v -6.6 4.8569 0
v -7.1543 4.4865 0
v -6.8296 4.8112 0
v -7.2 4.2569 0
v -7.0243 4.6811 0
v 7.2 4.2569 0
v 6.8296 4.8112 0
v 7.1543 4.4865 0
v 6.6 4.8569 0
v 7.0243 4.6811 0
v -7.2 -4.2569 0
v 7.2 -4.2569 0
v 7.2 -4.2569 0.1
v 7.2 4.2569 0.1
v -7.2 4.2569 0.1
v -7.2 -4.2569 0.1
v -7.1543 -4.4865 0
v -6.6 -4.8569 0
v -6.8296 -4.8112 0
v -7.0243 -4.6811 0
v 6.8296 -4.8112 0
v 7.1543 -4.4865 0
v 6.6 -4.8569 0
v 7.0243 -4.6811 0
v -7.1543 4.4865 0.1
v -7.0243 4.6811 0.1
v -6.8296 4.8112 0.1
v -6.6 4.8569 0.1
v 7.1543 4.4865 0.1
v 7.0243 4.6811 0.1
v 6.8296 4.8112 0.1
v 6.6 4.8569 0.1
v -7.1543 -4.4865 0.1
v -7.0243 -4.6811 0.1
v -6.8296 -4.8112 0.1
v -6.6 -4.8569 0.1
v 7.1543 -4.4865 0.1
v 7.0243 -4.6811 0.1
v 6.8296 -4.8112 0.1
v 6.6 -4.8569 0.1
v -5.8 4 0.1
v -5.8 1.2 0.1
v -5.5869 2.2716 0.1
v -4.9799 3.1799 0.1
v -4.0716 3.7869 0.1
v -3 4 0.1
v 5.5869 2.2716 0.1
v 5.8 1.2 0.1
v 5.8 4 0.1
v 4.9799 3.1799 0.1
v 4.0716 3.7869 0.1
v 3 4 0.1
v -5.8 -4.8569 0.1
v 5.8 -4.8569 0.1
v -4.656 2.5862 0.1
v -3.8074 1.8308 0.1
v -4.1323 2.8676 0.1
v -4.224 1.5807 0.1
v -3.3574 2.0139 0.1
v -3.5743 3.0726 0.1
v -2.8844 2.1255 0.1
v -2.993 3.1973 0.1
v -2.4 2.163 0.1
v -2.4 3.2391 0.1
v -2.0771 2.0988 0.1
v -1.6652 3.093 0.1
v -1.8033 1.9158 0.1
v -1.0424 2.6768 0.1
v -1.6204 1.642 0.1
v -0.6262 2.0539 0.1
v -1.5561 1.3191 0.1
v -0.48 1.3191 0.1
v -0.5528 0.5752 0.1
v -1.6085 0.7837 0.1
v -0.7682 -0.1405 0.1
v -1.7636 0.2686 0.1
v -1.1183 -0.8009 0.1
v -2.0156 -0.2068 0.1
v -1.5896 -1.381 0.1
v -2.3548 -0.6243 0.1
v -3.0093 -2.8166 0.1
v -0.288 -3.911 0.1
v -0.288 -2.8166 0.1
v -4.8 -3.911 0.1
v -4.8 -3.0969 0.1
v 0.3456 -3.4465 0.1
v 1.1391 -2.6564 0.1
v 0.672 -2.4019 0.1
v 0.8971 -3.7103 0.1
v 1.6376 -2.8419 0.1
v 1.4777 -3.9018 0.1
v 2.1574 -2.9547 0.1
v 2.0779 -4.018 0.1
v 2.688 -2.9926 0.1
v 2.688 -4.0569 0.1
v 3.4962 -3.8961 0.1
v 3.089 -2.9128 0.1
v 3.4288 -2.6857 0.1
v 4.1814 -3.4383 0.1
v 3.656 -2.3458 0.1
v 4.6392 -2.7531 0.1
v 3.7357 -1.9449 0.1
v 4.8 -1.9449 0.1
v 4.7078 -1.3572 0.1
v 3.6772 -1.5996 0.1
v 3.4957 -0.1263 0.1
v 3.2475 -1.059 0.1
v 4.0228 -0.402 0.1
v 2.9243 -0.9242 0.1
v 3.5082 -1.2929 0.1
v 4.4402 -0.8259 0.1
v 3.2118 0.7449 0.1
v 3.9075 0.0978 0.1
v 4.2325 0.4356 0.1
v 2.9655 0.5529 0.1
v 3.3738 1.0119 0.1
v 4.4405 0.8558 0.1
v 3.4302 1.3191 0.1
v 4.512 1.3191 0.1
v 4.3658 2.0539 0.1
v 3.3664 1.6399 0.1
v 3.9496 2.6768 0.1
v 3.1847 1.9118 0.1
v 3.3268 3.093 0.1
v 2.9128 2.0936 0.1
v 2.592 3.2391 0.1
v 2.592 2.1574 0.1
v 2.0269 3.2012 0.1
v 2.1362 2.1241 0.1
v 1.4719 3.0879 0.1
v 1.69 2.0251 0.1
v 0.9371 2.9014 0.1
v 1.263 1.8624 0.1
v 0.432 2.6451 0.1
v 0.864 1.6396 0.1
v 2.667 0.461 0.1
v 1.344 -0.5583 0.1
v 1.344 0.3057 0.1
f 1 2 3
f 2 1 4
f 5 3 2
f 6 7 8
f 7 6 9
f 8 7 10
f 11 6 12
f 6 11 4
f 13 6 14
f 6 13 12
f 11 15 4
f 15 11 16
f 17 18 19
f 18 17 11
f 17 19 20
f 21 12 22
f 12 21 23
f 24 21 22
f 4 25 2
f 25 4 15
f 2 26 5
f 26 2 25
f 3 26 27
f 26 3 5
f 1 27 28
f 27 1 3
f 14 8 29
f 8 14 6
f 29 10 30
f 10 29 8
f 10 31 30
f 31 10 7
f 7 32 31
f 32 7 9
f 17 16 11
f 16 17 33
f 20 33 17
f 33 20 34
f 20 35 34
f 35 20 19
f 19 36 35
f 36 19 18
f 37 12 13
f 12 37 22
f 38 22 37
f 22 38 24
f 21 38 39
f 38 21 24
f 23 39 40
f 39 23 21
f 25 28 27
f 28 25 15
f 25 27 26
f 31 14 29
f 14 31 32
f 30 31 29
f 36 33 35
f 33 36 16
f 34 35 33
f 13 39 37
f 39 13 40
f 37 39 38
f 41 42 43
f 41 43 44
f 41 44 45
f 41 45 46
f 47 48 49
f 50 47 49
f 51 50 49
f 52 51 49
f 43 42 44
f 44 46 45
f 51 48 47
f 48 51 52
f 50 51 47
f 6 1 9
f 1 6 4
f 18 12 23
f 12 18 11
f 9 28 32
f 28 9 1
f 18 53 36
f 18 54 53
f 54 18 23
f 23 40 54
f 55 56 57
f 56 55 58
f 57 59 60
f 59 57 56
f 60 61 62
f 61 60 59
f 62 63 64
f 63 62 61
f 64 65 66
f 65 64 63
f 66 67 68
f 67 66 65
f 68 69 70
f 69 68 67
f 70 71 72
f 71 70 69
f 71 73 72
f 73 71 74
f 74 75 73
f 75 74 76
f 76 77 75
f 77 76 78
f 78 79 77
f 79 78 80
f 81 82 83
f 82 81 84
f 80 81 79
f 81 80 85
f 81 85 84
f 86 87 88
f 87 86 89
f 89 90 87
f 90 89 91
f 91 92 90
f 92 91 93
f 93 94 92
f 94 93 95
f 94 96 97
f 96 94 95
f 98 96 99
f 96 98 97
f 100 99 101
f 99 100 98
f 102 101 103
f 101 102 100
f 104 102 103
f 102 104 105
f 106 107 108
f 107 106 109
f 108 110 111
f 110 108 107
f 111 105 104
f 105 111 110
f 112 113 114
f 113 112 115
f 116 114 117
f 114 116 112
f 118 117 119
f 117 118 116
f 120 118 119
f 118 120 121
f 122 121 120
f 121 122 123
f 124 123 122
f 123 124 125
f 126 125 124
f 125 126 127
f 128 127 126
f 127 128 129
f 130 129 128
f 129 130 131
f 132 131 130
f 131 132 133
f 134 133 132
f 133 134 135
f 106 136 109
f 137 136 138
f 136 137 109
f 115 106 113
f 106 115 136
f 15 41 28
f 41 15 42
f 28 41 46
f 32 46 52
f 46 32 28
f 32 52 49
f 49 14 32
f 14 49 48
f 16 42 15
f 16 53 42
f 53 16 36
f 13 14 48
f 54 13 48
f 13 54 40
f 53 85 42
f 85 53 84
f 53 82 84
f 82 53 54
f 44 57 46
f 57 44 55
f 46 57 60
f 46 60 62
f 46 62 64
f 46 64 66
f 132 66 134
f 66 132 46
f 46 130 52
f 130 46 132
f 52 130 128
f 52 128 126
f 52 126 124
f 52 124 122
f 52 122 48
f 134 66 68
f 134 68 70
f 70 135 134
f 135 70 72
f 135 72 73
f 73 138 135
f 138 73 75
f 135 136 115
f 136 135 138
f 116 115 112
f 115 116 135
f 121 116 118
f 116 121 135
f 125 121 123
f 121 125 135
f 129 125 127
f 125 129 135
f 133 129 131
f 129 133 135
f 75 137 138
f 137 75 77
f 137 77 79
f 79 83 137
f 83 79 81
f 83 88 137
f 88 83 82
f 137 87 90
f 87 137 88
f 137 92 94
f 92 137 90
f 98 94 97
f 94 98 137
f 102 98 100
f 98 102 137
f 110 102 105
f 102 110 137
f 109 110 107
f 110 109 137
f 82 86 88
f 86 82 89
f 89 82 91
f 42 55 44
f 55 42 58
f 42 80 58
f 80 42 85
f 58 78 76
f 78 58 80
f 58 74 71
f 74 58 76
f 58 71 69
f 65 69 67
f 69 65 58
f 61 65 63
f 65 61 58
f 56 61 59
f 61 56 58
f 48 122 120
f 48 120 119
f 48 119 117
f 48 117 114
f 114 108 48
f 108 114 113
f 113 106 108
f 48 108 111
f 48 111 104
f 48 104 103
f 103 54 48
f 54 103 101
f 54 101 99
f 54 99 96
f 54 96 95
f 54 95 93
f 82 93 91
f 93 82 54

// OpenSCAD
// file: ../p/box3u12.scad
use <../lib.scad>
function ldraw_lib__box3u12() = [
// 0 Box with 3 Parallel Faces without Any Edges
// 0 Name: box3u12.dat
// 0 Author: J.C. Tchang [tchang]
// 0 !LDRAW_ORG Primitive UPDATE 2014-02
// 0 !LICENSE Licensed under CC BY 4.0 : see CAreadme.txt
// 
// 0 BFC CERTIFY CCW
  [0,"BFC","CERTIFY"],
  [0,"BFC","CCW"],
// 
// 0 !HISTORY 2014-12-23 [PTadmin] Official Update 2014-02
// 
// 
// 4 16 -1 1 1 1 1 1 1 1 -1 -1 1 -1
  [4,16,-1,1,1,1,1,1,1,1,-1,-1,1,-1],
// 4 16 -1 1 1 -1 0 1 1 0 1 1 1 1
  [4,16,-1,1,1,-1,0,1,1,0,1,1,1,1],
// 4 16 1 1 -1 1 0 -1 -1 0 -1 -1 1 -1
  [4,16,1,1,-1,1,0,-1,-1,0,-1,-1,1,-1],
];
module ldraw_lib__box3u12(step=0, col=false, unit=2/5, alt=false, line=0.2, solid=!$preview)
    makepoly(ldraw_lib__box3u12(), step=step, col=col, unit=unit, alt=alt, line=line, solid=solid);
ldraw_lib__box3u12(line=0.2);
// file: ../p/1-8chrd.scad
use <../lib.scad>
function ldraw_lib__1_8chrd() = [
// 0 Chord 0.125
// 0 Name: 1-8chrd.dat
// 0 Author: Orion Pobursky [OrionP]
// 0 !LDRAW_ORG Primitive UPDATE 2023-05
// 0 !LICENSE Licensed under CC BY 4.0 : see CAreadme.txt
// 
// 0 BFC CERTIFY CCW
  [0,"BFC","CERTIFY"],
  [0,"BFC","CCW"],
// 
// 0 !HISTORY 2004-04-22 [PTadmin] Official Update 2004-02
// 0 !HISTORY 2007-06-22 [PTadmin] Header formatted for Contributor Agreement
// 0 !HISTORY 2008-07-01 [PTadmin] Official Update 2008-01
// 0 !HISTORY 2023-10-27 [OrionP] Rebuilt with PrimGen2, original author westrate
// 0 !HISTORY 2023-10-31 [OrionP] Official Update 2023-05
// 
// 3 16 1 0 0 0.9239 0 0.3827 0.7071 0 0.7071
  [3,16,1,0,0,0.9239,0,0.3827,0.7071,0,0.7071],
];
module ldraw_lib__1_8chrd(step=0, col=false, unit=2/5, alt=false, line=0.2, solid=!$preview)
    makepoly(ldraw_lib__1_8chrd(), step=step, col=col, unit=unit, alt=alt, line=line, solid=solid);
ldraw_lib__1_8chrd(line=0.2);
// file: ../p/1-4ndis.scad
use <../lib.scad>
function ldraw_lib__1_4ndis() = [
// 0 Disc Negative 0.25
// 0 Name: 1-4ndis.dat
// 0 Author: James Jessiman
// 0 !LDRAW_ORG Primitive UPDATE 2012-01
// 0 !LICENSE Licensed under CC BY 4.0 : see CAreadme.txt
// 
// 0 BFC CERTIFY CCW
  [0,"BFC","CERTIFY"],
  [0,"BFC","CCW"],
// 
// 0 !HISTORY 2002-03-23 [sbliss] Added BFC Statement
// 0 !HISTORY 2002-04-25 [PTadmin] Official Update 2002-02
// 0 !HISTORY 2007-06-22 [PTadmin] Header formatted for Contributor Agreement
// 0 !HISTORY 2008-07-01 [PTadmin] Official Update 2008-01
// 0 !HISTORY 2012-02-16 [Philo] Changed to CCW
// 0 !HISTORY 2012-03-30 [PTadmin] Official Update 2012-01
// 
// 
// 3 16 0.9239 0 0.3827 1 0 0 1 0 1
  [3,16,0.9239,0,0.3827,1,0,0,1,0,1],
// 3 16 0.7071 0 0.7071 0.9239 0 0.3827 1 0 1
  [3,16,0.7071,0,0.7071,0.9239,0,0.3827,1,0,1],
// 3 16 0.3827 0 0.9239 0.7071 0 0.7071 1 0 1
  [3,16,0.3827,0,0.9239,0.7071,0,0.7071,1,0,1],
// 3 16 0 0 1 0.3827 0 0.9239 1 0 1
  [3,16,0,0,1,0.3827,0,0.9239,1,0,1],
];
module ldraw_lib__1_4ndis(step=0, col=false, unit=2/5, alt=false, line=0.2, solid=!$preview)
    makepoly(ldraw_lib__1_4ndis(), step=step, col=col, unit=unit, alt=alt, line=line, solid=solid);
ldraw_lib__1_4ndis(line=0.2);
// file: ../p/1-4cyli.scad
use <../lib.scad>
function ldraw_lib__1_4cyli() = [
// 0 Cylinder 0.25
// 0 Name: 1-4cyli.dat
// 0 Author: James Jessiman
// 0 !LDRAW_ORG Primitive UPDATE 2012-01
// 0 !LICENSE Licensed under CC BY 4.0 : see CAreadme.txt
// 
// 0 BFC CERTIFY CCW
  [0,"BFC","CERTIFY"],
  [0,"BFC","CCW"],
// 
// 0 !HISTORY 2002-03-23 [sbliss] Added BFC statement.
// 0 !HISTORY 2002-04-25 [PTadmin] Official Update 2002-02
// 0 !HISTORY 2007-06-22 [PTadmin] Header formatted for Contributor Agreement
// 0 !HISTORY 2008-07-01 [PTadmin] Official Update 2008-01
// 0 !HISTORY 2012-02-16 [Philo] Changed to CCW
// 0 !HISTORY 2012-03-30 [PTadmin] Official Update 2012-01
// 
// 
// 4 16 1 1 0 0.9239 1 0.3827 0.9239 0 0.3827 1 0 0
  [4,16,1,1,0,0.9239,1,0.3827,0.9239,0,0.3827,1,0,0],
// 5 24 1 0 0 1 1 0 0.9239 0 0.3827 1 0 -1
  [5,24,1,0,0,1,1,0,0.9239,0,0.3827,1,0,-1],
// 4 16 0.9239 1 0.3827 0.7071 1 0.7071 0.7071 0 0.7071 0.9239 0 0.3827
  [4,16,0.9239,1,0.3827,0.7071,1,0.7071,0.7071,0,0.7071,0.9239,0,0.3827],
// 5 24 0.9239 0 0.3827 0.9239 1 0.3827 0.7071 0 0.7071 1 0 0
  [5,24,0.9239,0,0.3827,0.9239,1,0.3827,0.7071,0,0.7071,1,0,0],
// 4 16 0.7071 1 0.7071 0.3827 1 0.9239 0.3827 0 0.9239 0.7071 0 0.7071
  [4,16,0.7071,1,0.7071,0.3827,1,0.9239,0.3827,0,0.9239,0.7071,0,0.7071],
// 5 24 0.7071 0 0.7071 0.7071 1 0.7071 0.3827 0 0.9239 0.9239 0 0.3827
  [5,24,0.7071,0,0.7071,0.7071,1,0.7071,0.3827,0,0.9239,0.9239,0,0.3827],
// 4 16 0.3827 1 0.9239 0 1 1 0 0 1 0.3827 0 0.9239
  [4,16,0.3827,1,0.9239,0,1,1,0,0,1,0.3827,0,0.9239],
// 5 24 0.3827 0 0.9239 0.3827 1 0.9239 0 0 1 0.7071 0 0.7071
  [5,24,0.3827,0,0.9239,0.3827,1,0.9239,0,0,1,0.7071,0,0.7071],
// 5 24 0 0 1 0 1 1 0.3827 0 0.9239 -1 0 1
  [5,24,0,0,1,0,1,1,0.3827,0,0.9239,-1,0,1],
];
module ldraw_lib__1_4cyli(step=0, col=false, unit=2/5, alt=false, line=0.2, solid=!$preview)
    makepoly(ldraw_lib__1_4cyli(), step=step, col=col, unit=unit, alt=alt, line=line, solid=solid);
ldraw_lib__1_4cyli(line=0.2);
// file: ../p/1-4chrd.scad
use <../lib.scad>
function ldraw_lib__1_4chrd() = [
// 0 Chord 0.25
// 0 Name: 1-4chrd.dat
// 0 Author: Max Martin Richter [MMR1988]
// 0 !LDRAW_ORG Primitive UPDATE 2023-05
// 0 !LICENSE Licensed under CC BY 4.0 : see CAreadme.txt
// 
// 0 BFC CERTIFY CCW
  [0,"BFC","CERTIFY"],
  [0,"BFC","CCW"],
// 
// 0 !HISTORY 2004-04-22 [PTadmin] Official Update 2004-02
// 0 !HISTORY 2007-10-09 [PTadmin] Header formatted for Contributor Agreement
// 0 !HISTORY 2008-07-01 [PTadmin] Official Update 2008-01
// 0 !HISTORY 2012-08-02 [MMR1988] Re-creation with PrimGen2 and Rectifier
// 0 !HISTORY 2012-08-09 [PTadmin] Official Update 2012-02
// 0 !HISTORY 2023-10-27 [OrionP] Change author to MMR1988 from hafhead
// 0 !HISTORY 2023-10-31 [OrionP] Official Update 2023-05
// 
// 4 16 0.9239 0 0.3827 0.3827 0 0.9239 0 0 1 1 0 0
  [4,16,0.9239,0,0.3827,0.3827,0,0.9239,0,0,1,1,0,0],
// 3 16 0.7071 0 0.7071 0.3827 0 0.9239 0.9239 0 0.3827
  [3,16,0.7071,0,0.7071,0.3827,0,0.9239,0.9239,0,0.3827],
];
module ldraw_lib__1_4chrd(step=0, col=false, unit=2/5, alt=false, line=0.2, solid=!$preview)
    makepoly(ldraw_lib__1_4chrd(), step=step, col=col, unit=unit, alt=alt, line=line, solid=solid);
ldraw_lib__1_4chrd(line=0.2);
// main file
use <../lib.scad>
use <../p/1-4chrd.scad>
use <../p/1-4cyli.scad>
use <../p/1-4ndis.scad>
use <../p/1-8chrd.scad>
use <../p/box3u12.scad>
function ldraw_lib__6148328ak() = [
// 0 Sticker  1.2 x  1.8 with Black "23" in White Arch on Red Background
// 0 Name: 6148328ak.dat
// 0 Author: Massimo Maso [Sirio]
// 0 !LDRAW_ORG Part UPDATE 2024-08
// 0 !LICENSE Licensed under CC BY 4.0 : see CAreadme.txt
// 
// 0 BFC CERTIFY CCW
  [0,"BFC","CERTIFY"],
  [0,"BFC","CCW"],
// 
// 0 !KEYWORDS 917K, Bricklink 75876stk01, Brickowl 852010, Pit Lane, Porsche
// 0 !KEYWORDS Rebrickable 26357, set 75876, Speed Champions
// 
// 0 !HISTORY 2024-09-30 [OrionP] Official Update 2024-08
// 
// 
// 0 // Primitives
// 
// 1 16 -16.5 0 10.6422 -1.5 0 0 0 -1 0 0 0 1.5 1-4chrd.dat
  [1,16,-16.5,0,10.6422,-1.5,0,0,0,-1,0,0,0,1.5, ldraw_lib__1_4chrd()],
// 1 16 16.5 0 10.6422 1.5 0 0 0 -1 0 0 0 1.5 1-4chrd.dat
  [1,16,16.5,0,10.6422,1.5,0,0,0,-1,0,0,0,1.5, ldraw_lib__1_4chrd()],
// 1 16 0 -.25 0 0 0 18 0 .25 0 10.6422 0 0 box3u12.dat
  [1,16,0,-.25,0,0,0,18,0,.25,0,10.6422,0,0, ldraw_lib__box3u12()],
// 1 16 -16.5 0 -10.6422 -1.5 0 0 0 -1 0 0 0 -1.5 1-4chrd.dat
  [1,16,-16.5,0,-10.6422,-1.5,0,0,0,-1,0,0,0,-1.5, ldraw_lib__1_4chrd()],
// 1 16 16.5 0 -10.6422 1.5 0 0 0 -1 0 0 0 -1.5 1-4chrd.dat
  [1,16,16.5,0,-10.6422,1.5,0,0,0,-1,0,0,0,-1.5, ldraw_lib__1_4chrd()],
// 1 16 -16.5 0 10.6422 -1.5 0 0 0 -.25 0 0 0 1.5 1-4cyli.dat
  [1,16,-16.5,0,10.6422,-1.5,0,0,0,-.25,0,0,0,1.5, ldraw_lib__1_4cyli()],
// 1 16 16.5 0 10.6422 1.5 0 0 0 -.25 0 0 0 1.5 1-4cyli.dat
  [1,16,16.5,0,10.6422,1.5,0,0,0,-.25,0,0,0,1.5, ldraw_lib__1_4cyli()],
// 1 16 -16.5 0 -10.6422 -1.5 0 0 0 -.25 0 0 0 -1.5 1-4cyli.dat
  [1,16,-16.5,0,-10.6422,-1.5,0,0,0,-.25,0,0,0,-1.5, ldraw_lib__1_4cyli()],
// 1 16 16.5 0 -10.6422 1.5 0 0 0 -.25 0 0 0 -1.5 1-4cyli.dat
  [1,16,16.5,0,-10.6422,1.5,0,0,0,-.25,0,0,0,-1.5, ldraw_lib__1_4cyli()],
// 1 4 -16.5 -.25 10.6422 -1.5 0 0 0 1 0 0 0 1.5 1-4chrd.dat
  [1,4,-16.5,-.25,10.6422,-1.5,0,0,0,1,0,0,0,1.5, ldraw_lib__1_4chrd()],
// 1 4 16.5 -.25 10.6422 1.5 0 0 0 1 0 0 0 1.5 1-4chrd.dat
  [1,4,16.5,-.25,10.6422,1.5,0,0,0,1,0,0,0,1.5, ldraw_lib__1_4chrd()],
// 1 4 -16.5 -.25 -10.6422 -1.5 0 0 0 1 0 0 0 -1.5 1-4chrd.dat
  [1,4,-16.5,-.25,-10.6422,-1.5,0,0,0,1,0,0,0,-1.5, ldraw_lib__1_4chrd()],
// 1 4 16.5 -.25 -10.6422 1.5 0 0 0 1 0 0 0 -1.5 1-4chrd.dat
  [1,4,16.5,-.25,-10.6422,1.5,0,0,0,1,0,0,0,-1.5, ldraw_lib__1_4chrd()],
// 1 4 -7.5 -.25 3 -7 0 0 0 1 0 0 0 7 1-4ndis.dat
  [1,4,-7.5,-.25,3,-7,0,0,0,1,0,0,0,7, ldraw_lib__1_4ndis()],
// 1 4 7.5 -.25 3 7 0 0 0 1 0 0 0 7 1-4ndis.dat
  [1,4,7.5,-.25,3,7,0,0,0,1,0,0,0,7, ldraw_lib__1_4ndis()],
// 1 15 -7.5 -.25 3 -7 0 0 0 1 0 0 0 7 1-8chrd.dat
  [1,15,-7.5,-.25,3,-7,0,0,0,1,0,0,0,7, ldraw_lib__1_8chrd()],
// 1 15 -7.5 -.25 3 0 0 -7 0 1 0 7 0 0 1-8chrd.dat
  [1,15,-7.5,-.25,3,0,0,-7,0,1,0,7,0,0, ldraw_lib__1_8chrd()],
// 1 15 7.5 -.25 3 7 0 0 0 1 0 0 0 7 1-4chrd.dat
  [1,15,7.5,-.25,3,7,0,0,0,1,0,0,0,7, ldraw_lib__1_4chrd()],
// 0 // Bottom faces
// 4 16 16.5 0 12.1422 18 0 10.6422 -18 0 10.6422 -16.5 0 12.1422
  [4,16,16.5,0,12.1422,18,0,10.6422,-18,0,10.6422,-16.5,0,12.1422],
// 4 16 16.5 0 -12.1422 -16.5 0 -12.1422 -18 0 -10.6422 18 0 -10.6422
  [4,16,16.5,0,-12.1422,-16.5,0,-12.1422,-18,0,-10.6422,18,0,-10.6422],
// 0 // Lateral faces
// 4 16 -16.5 0 12.1422 -16.5 -.25 12.1422 16.5 -.25 12.1422 16.5 0 12.1422
  [4,16,-16.5,0,12.1422,-16.5,-.25,12.1422,16.5,-.25,12.1422,16.5,0,12.1422],
// 3 16 -16.5 0 -12.1422 -14.5 -.25 -12.1422 -16.5 -.25 -12.1422
  [3,16,-16.5,0,-12.1422,-14.5,-.25,-12.1422,-16.5,-.25,-12.1422],
// 4 16 -16.5 0 -12.1422 16.5 0 -12.1422 14.5 -.25 -12.1422 -14.5 -.25 -12.1422
  [4,16,-16.5,0,-12.1422,16.5,0,-12.1422,14.5,-.25,-12.1422,-14.5,-.25,-12.1422],
// 3 16 16.5 0 -12.1422 16.5 -.25 -12.1422 14.5 -.25 -12.1422
  [3,16,16.5,0,-12.1422,16.5,-.25,-12.1422,14.5,-.25,-12.1422],
// 0 // Top faces
// 0 // Black numer "23"
// 0 // Number "2"
// 4 0 -11.64 -.25 6.4655 -10.56 -.25 3.9517 -9.5186 -.25 4.577 -10.3308 -.25 7.1689
  [4,0,-11.64,-.25,6.4655,-10.56,-.25,3.9517,-9.5186,-.25,4.577,-10.3308,-.25,7.1689],
// 4 0 -10.3308 -.25 7.1689 -9.5186 -.25 4.577 -8.3934 -.25 5.0347 -8.9357 -.25 7.6815
  [4,0,-10.3308,-.25,7.1689,-9.5186,-.25,4.577,-8.3934,-.25,5.0347,-8.9357,-.25,7.6815],
// 4 0 -8.9357 -.25 7.6815 -8.3934 -.25 5.0347 -7.2111 -.25 5.3137 -7.4825 -.25 7.9932
  [4,0,-8.9357,-.25,7.6815,-8.3934,-.25,5.0347,-7.2111,-.25,5.3137,-7.4825,-.25,7.9932],
// 4 0 -7.4825 -.25 7.9932 -7.2111 -.25 5.3137 -6 -.25 5.4075 -6 -.25 8.0978
  [4,0,-7.4825,-.25,7.9932,-7.2111,-.25,5.3137,-6,-.25,5.4075,-6,-.25,8.0978],
// 4 0 -6 -.25 8.0978 -6 -.25 5.4075 -5.1927 -.25 5.2469 -4.1631 -.25 7.7324
  [4,0,-6,-.25,8.0978,-6,-.25,5.4075,-5.1927,-.25,5.2469,-4.1631,-.25,7.7324],
// 4 0 -4.1631 -.25 7.7324 -5.1927 -.25 5.2469 -4.5082 -.25 4.7896 -2.6059 -.25 6.6919
  [4,0,-4.1631,-.25,7.7324,-5.1927,-.25,5.2469,-4.5082,-.25,4.7896,-2.6059,-.25,6.6919],
// 4 0 -2.6059 -.25 6.6919 -4.5082 -.25 4.7896 -4.0509 -.25 4.1051 -1.5654 -.25 5.1347
  [4,0,-2.6059,-.25,6.6919,-4.5082,-.25,4.7896,-4.0509,-.25,4.1051,-1.5654,-.25,5.1347],
// 4 0 -1.5654 -.25 5.1347 -4.0509 -.25 4.1051 -3.8903 -.25 3.2978 -1.2 -.25 3.2978
  [4,0,-1.5654,-.25,5.1347,-4.0509,-.25,4.1051,-3.8903,-.25,3.2978,-1.2,-.25,3.2978],
// 4 0 -1.2 -.25 3.2978 -3.8903 -.25 3.2978 -4.0212 -.25 1.9592 -1.3819 -.25 1.438
  [4,0,-1.2,-.25,3.2978,-3.8903,-.25,3.2978,-4.0212,-.25,1.9592,-1.3819,-.25,1.438],
// 4 0 -1.3819 -.25 1.438 -4.0212 -.25 1.9592 -4.409 -.25 .6714 -1.9206 -.25 -.3513
  [4,0,-1.3819,-.25,1.438,-4.0212,-.25,1.9592,-4.409,-.25,.6714,-1.9206,-.25,-.3513],
// 4 0 -1.9206 -.25 -.3513 -4.409 -.25 .6714 -5.0389 -.25 -.517 -2.7957 -.25 -2.0023
  [4,0,-1.9206,-.25,-.3513,-4.409,-.25,.6714,-5.0389,-.25,-.517,-2.7957,-.25,-2.0023],
// 4 0 -2.7957 -.25 -2.0023 -5.0389 -.25 -.517 -5.887 -.25 -1.5608 -3.9741 -.25 -3.4525
  [4,0,-2.7957,-.25,-2.0023,-5.0389,-.25,-.517,-5.887,-.25,-1.5608,-3.9741,-.25,-3.4525],
// 4 0 -7.5232 -.25 -7.0414 -12 -.25 -9.7774 -.72 -.25 -9.7774 -.72 -.25 -7.0414
  [4,0,-7.5232,-.25,-7.0414,-12,-.25,-9.7774,-.72,-.25,-9.7774,-.72,-.25,-7.0414],
// 4 0 -7.5232 -.25 -7.0414 -3.9741 -.25 -3.4525 -5.887 -.25 -1.5608 -12 -.25 -7.7422
  [4,0,-7.5232,-.25,-7.0414,-3.9741,-.25,-3.4525,-5.887,-.25,-1.5608,-12,-.25,-7.7422],
// 3 0 -7.5232 -.25 -7.0414 -12 -.25 -7.7422 -12 -.25 -9.7774
  [3,0,-7.5232,-.25,-7.0414,-12,-.25,-7.7422,-12,-.25,-9.7774],
// 0 // Number "3"
// 4 0 1.68 -.25 -6.0048 .864 -.25 -8.6163 2.2428 -.25 -9.2757 2.8478 -.25 -6.6409
  [4,0,1.68,-.25,-6.0048,.864,-.25,-8.6163,2.2428,-.25,-9.2757,2.8478,-.25,-6.6409],
// 4 0 2.8478 -.25 -6.6409 2.2428 -.25 -9.2757 3.6942 -.25 -9.7545 4.0941 -.25 -7.1047
  [4,0,2.8478,-.25,-6.6409,2.2428,-.25,-9.2757,3.6942,-.25,-9.7545,4.0941,-.25,-7.1047],
// 4 0 4.0941 -.25 -7.1047 3.6942 -.25 -9.7545 5.1947 -.25 -10.0449 5.3936 -.25 -7.3868
  [4,0,4.0941,-.25,-7.1047,3.6942,-.25,-9.7545,5.1947,-.25,-10.0449,5.3936,-.25,-7.3868],
// 4 0 5.3936 -.25 -7.3868 5.1947 -.25 -10.0449 6.72 -.25 -10.1422 6.72 -.25 -7.4815
  [4,0,5.3936,-.25,-7.3868,5.1947,-.25,-10.0449,6.72,-.25,-10.1422,6.72,-.25,-7.4815],
// 4 0 6.72 -.25 -7.4815 6.72 -.25 -10.1422 8.7406 -.25 -9.7403 7.7224 -.25 -7.2821
  [4,0,6.72,-.25,-7.4815,6.72,-.25,-10.1422,8.7406,-.25,-9.7403,7.7224,-.25,-7.2821],
// 4 0 7.7224 -.25 -7.2821 8.7406 -.25 -9.7403 10.4535 -.25 -8.5957 8.5721 -.25 -6.7143
  [4,0,7.7224,-.25,-7.2821,8.7406,-.25,-9.7403,10.4535,-.25,-8.5957,8.5721,-.25,-6.7143],
// 4 0 8.5721 -.25 -6.7143 10.4535 -.25 -8.5957 11.5981 -.25 -6.8828 9.1399 -.25 -5.8646
  [4,0,8.5721,-.25,-6.7143,10.4535,-.25,-8.5957,11.5981,-.25,-6.8828,9.1399,-.25,-5.8646],
// 4 0 9.1399 -.25 -5.8646 11.5981 -.25 -6.8828 12 -.25 -4.8622 9.3393 -.25 -4.8622
  [4,0,9.1399,-.25,-5.8646,11.5981,-.25,-6.8828,12,-.25,-4.8622,9.3393,-.25,-4.8622],
// 4 0 9.3393 -.25 -4.8622 12 -.25 -4.8622 11.7696 -.25 -3.393 9.193 -.25 -3.999
  [4,0,9.3393,-.25,-4.8622,12,-.25,-4.8622,11.7696,-.25,-3.393,9.193,-.25,-3.999],
// 4 0 7.3108 -.25 -2.3104 8.1187 -.25 -2.6476 10.0571 -.25 -1.0051 8.7393 -.25 -.3157
  [4,0,7.3108,-.25,-2.3104,8.1187,-.25,-2.6476,10.0571,-.25,-1.0051,8.7393,-.25,-.3157],
// 4 0 11.1006 -.25 -2.0648 10.0571 -.25 -1.0051 8.1187 -.25 -2.6476 8.7704 -.25 -3.2323
  [4,0,11.1006,-.25,-2.0648,10.0571,-.25,-1.0051,8.1187,-.25,-2.6476,8.7704,-.25,-3.2323],
// 4 0 9.193 -.25 -3.999 11.7696 -.25 -3.393 11.1006 -.25 -2.0648 8.7704 -.25 -3.2323
  [4,0,9.193,-.25,-3.999,11.7696,-.25,-3.393,11.1006,-.25,-2.0648,8.7704,-.25,-3.2323],
// 4 0 7.4137 -.25 1.3822 9.7687 -.25 .2445 10.5813 -.25 1.0891 8.0295 -.25 1.8622
  [4,0,7.4137,-.25,1.3822,9.7687,-.25,.2445,10.5813,-.25,1.0891,8.0295,-.25,1.8622],
// 4 0 11.1012 -.25 2.1395 8.4344 -.25 2.5298 8.0295 -.25 1.8622 10.5813 -.25 1.0891
  [4,0,11.1012,-.25,2.1395,8.4344,-.25,2.5298,8.0295,-.25,1.8622,10.5813,-.25,1.0891],
// 4 0 8.4344 -.25 2.5298 11.1012 -.25 2.1395 11.28 -.25 3.2978 8.5756 -.25 3.2978
  [4,0,8.4344,-.25,2.5298,11.1012,-.25,2.1395,11.28,-.25,3.2978,8.5756,-.25,3.2978],
// 4 0 8.5756 -.25 3.2978 11.28 -.25 3.2978 10.9146 -.25 5.1347 8.4161 -.25 4.0997
  [4,0,8.5756,-.25,3.2978,11.28,-.25,3.2978,10.9146,-.25,5.1347,8.4161,-.25,4.0997],
// 4 0 8.4161 -.25 4.0997 10.9146 -.25 5.1347 9.8741 -.25 6.6919 7.9618 -.25 4.7796
  [4,0,8.4161,-.25,4.0997,10.9146,-.25,5.1347,9.8741,-.25,6.6919,7.9618,-.25,4.7796],
// 4 0 7.9618 -.25 4.7796 9.8741 -.25 6.6919 8.3169 -.25 7.7324 7.2819 -.25 5.2339
  [4,0,7.9618,-.25,4.7796,9.8741,-.25,6.6919,8.3169,-.25,7.7324,7.2819,-.25,5.2339],
// 4 0 7.2819 -.25 5.2339 8.3169 -.25 7.7324 6.48 -.25 8.0978 6.48 -.25 5.3934
  [4,0,7.2819,-.25,5.2339,8.3169,-.25,7.7324,6.48,-.25,8.0978,6.48,-.25,5.3934],
// 4 0 5.0672 -.25 8.0029 5.3405 -.25 5.3103 6.48 -.25 5.3934 6.48 -.25 8.0978
  [4,0,5.0672,-.25,8.0029,5.3405,-.25,5.3103,6.48,-.25,5.3934,6.48,-.25,8.0978],
// 4 0 5.3405 -.25 5.3103 5.0672 -.25 8.0029 3.6798 -.25 7.7198 4.2251 -.25 5.0628
  [4,0,5.3405,-.25,5.3103,5.0672,-.25,8.0029,3.6798,-.25,7.7198,4.2251,-.25,5.0628],
// 4 0 4.2251 -.25 5.0628 3.6798 -.25 7.7198 2.3427 -.25 7.2536 3.1574 -.25 4.6561
  [4,0,4.2251,-.25,5.0628,3.6798,-.25,7.7198,2.3427,-.25,7.2536,3.1574,-.25,4.6561],
// 4 0 3.1574 -.25 4.6561 2.3427 -.25 7.2536 1.08 -.25 6.6127 2.16 -.25 4.0989
  [4,0,3.1574,-.25,4.6561,2.3427,-.25,7.2536,1.08,-.25,6.6127,2.16,-.25,4.0989],
// 3 0 8.7393 -.25 -.3157 6.6674 -.25 1.1525 7.3108 -.25 -2.3104
  [3,0,8.7393,-.25,-.3157,6.6674,-.25,1.1525,7.3108,-.25,-2.3104],
// 4 0 3.36 -.25 .7643 3.36 -.25 -1.3957 7.3108 -.25 -2.3104 6.6674 -.25 1.1525
  [4,0,3.36,-.25,.7643,3.36,-.25,-1.3957,7.3108,-.25,-2.3104,6.6674,-.25,1.1525],
// 4 0 6.6674 -.25 1.1525 8.7393 -.25 -.3157 9.7687 -.25 .2445 7.4137 -.25 1.3822
  [4,0,6.6674,-.25,1.1525,8.7393,-.25,-.3157,9.7687,-.25,.2445,7.4137,-.25,1.3822],
// 0 // Red faces
// 4 4 -16.5 -.25 12.1422 -18 -.25 10.6422 -14.5 -.25 3 -14.5 -.25 10
  [4,4,-16.5,-.25,12.1422,-18,-.25,10.6422,-14.5,-.25,3,-14.5,-.25,10],
// 3 4 -16.5 -.25 12.1422 -14.5 -.25 10 -7.5 -.25 10
  [3,4,-16.5,-.25,12.1422,-14.5,-.25,10,-7.5,-.25,10],
// 4 4 -16.5 -.25 12.1422 -7.5 -.25 10 7.5 -.25 10 16.5 -.25 12.1422
  [4,4,-16.5,-.25,12.1422,-7.5,-.25,10,7.5,-.25,10,16.5,-.25,12.1422],
// 3 4 16.5 -.25 12.1422 7.5 -.25 10 14.5 -.25 10
  [3,4,16.5,-.25,12.1422,7.5,-.25,10,14.5,-.25,10],
// 4 4 16.5 -.25 12.1422 14.5 -.25 10 14.5 -.25 3 18 -.25 10.6422
  [4,4,16.5,-.25,12.1422,14.5,-.25,10,14.5,-.25,3,18,-.25,10.6422],
// 3 4 -18 -.25 -10.6422 -14.5 -.25 3 -18 -.25 10.6422
  [3,4,-18,-.25,-10.6422,-14.5,-.25,3,-18,-.25,10.6422],
// 4 4 -18 -.25 -10.6422 -16.5 -.25 -12.1422 -14.5 -.25 -12.1422 -14.5 -.25 3
  [4,4,-18,-.25,-10.6422,-16.5,-.25,-12.1422,-14.5,-.25,-12.1422,-14.5,-.25,3],
// 3 4 18 -.25 -10.6422 18 -.25 10.6422 14.5 -.25 3
  [3,4,18,-.25,-10.6422,18,-.25,10.6422,14.5,-.25,3],
// 4 4 18 -.25 -10.6422 14.5 -.25 3 14.5 -.25 -12.1422 16.5 -.25 -12.1422
  [4,4,18,-.25,-10.6422,14.5,-.25,3,14.5,-.25,-12.1422,16.5,-.25,-12.1422],
// 0 // White faces
// 4 15 -14.5 -.25 -12.1422 -12 -.25 -9.7774 -12 -.25 -7.7422 -14.5 -.25 3
  [4,15,-14.5,-.25,-12.1422,-12,-.25,-9.7774,-12,-.25,-7.7422,-14.5,-.25,3],
// 4 15 -14.5 -.25 -12.1422 14.5 -.25 -12.1422 -.72 -.25 -9.7774 -12 -.25 -9.7774
  [4,15,-14.5,-.25,-12.1422,14.5,-.25,-12.1422,-.72,-.25,-9.7774,-12,-.25,-9.7774],
// 4 15 -7.5 -.25 10 -12.4497 -.25 7.9497 -11.64 -.25 6.4655 -10.3308 -.25 7.1689
  [4,15,-7.5,-.25,10,-12.4497,-.25,7.9497,-11.64,-.25,6.4655,-10.3308,-.25,7.1689],
// 3 15 -7.5 -.25 10 -10.3308 -.25 7.1689 -8.9357 -.25 7.6815
  [3,15,-7.5,-.25,10,-10.3308,-.25,7.1689,-8.9357,-.25,7.6815],
// 3 15 -7.5 -.25 10 -8.9357 -.25 7.6815 -7.4825 -.25 7.9932
  [3,15,-7.5,-.25,10,-8.9357,-.25,7.6815,-7.4825,-.25,7.9932],
// 3 15 -7.5 -.25 10 -7.4825 -.25 7.9932 -6 -.25 8.0978
  [3,15,-7.5,-.25,10,-7.4825,-.25,7.9932,-6,-.25,8.0978],
// 3 15 -7.5 -.25 10 -6 -.25 8.0978 -4.1631 -.25 7.7324
  [3,15,-7.5,-.25,10,-6,-.25,8.0978,-4.1631,-.25,7.7324],
// 4 15 -7.5 -.25 10 -4.1631 -.25 7.7324 1.08 -.25 6.6127 2.3427 -.25 7.2536
  [4,15,-7.5,-.25,10,-4.1631,-.25,7.7324,1.08,-.25,6.6127,2.3427,-.25,7.2536],
// 4 15 -7.5 -.25 10 2.3427 -.25 7.2536 3.6798 -.25 7.7198 7.5 -.25 10
  [4,15,-7.5,-.25,10,2.3427,-.25,7.2536,3.6798,-.25,7.7198,7.5,-.25,10],
// 3 15 7.5 -.25 10 3.6798 -.25 7.7198 5.0672 -.25 8.0029
  [3,15,7.5,-.25,10,3.6798,-.25,7.7198,5.0672,-.25,8.0029],
// 3 15 7.5 -.25 10 5.0672 -.25 8.0029 6.48 -.25 8.0978
  [3,15,7.5,-.25,10,5.0672,-.25,8.0029,6.48,-.25,8.0978],
// 3 15 7.5 -.25 10 6.48 -.25 8.0978 8.3169 -.25 7.7324
  [3,15,7.5,-.25,10,6.48,-.25,8.0978,8.3169,-.25,7.7324],
// 3 15 7.5 -.25 10 8.3169 -.25 7.7324 9.8741 -.25 6.6919
  [3,15,7.5,-.25,10,8.3169,-.25,7.7324,9.8741,-.25,6.6919],
// 3 15 7.5 -.25 10 9.8741 -.25 6.6919 14.5 -.25 3
  [3,15,7.5,-.25,10,9.8741,-.25,6.6919,14.5,-.25,3],
// 3 15 1.08 -.25 6.6127 -4.1631 -.25 7.7324 -2.6059 -.25 6.6919
  [3,15,1.08,-.25,6.6127,-4.1631,-.25,7.7324,-2.6059,-.25,6.6919],
// 3 15 1.08 -.25 6.6127 -2.6059 -.25 6.6919 -1.5654 -.25 5.1347
  [3,15,1.08,-.25,6.6127,-2.6059,-.25,6.6919,-1.5654,-.25,5.1347],
// 4 15 2.16 -.25 4.0989 1.08 -.25 6.6127 -1.5654 -.25 5.1347 -1.2 -.25 3.2978
  [4,15,2.16,-.25,4.0989,1.08,-.25,6.6127,-1.5654,-.25,5.1347,-1.2,-.25,3.2978],
// 3 15 2.16 -.25 4.0989 -1.2 -.25 3.2978 -1.3819 -.25 1.438
  [3,15,2.16,-.25,4.0989,-1.2,-.25,3.2978,-1.3819,-.25,1.438],
// 4 15 2.16 -.25 4.0989 -1.3819 -.25 1.438 -1.9206 -.25 -.3513 3.36 -.25 .7643
  [4,15,2.16,-.25,4.0989,-1.3819,-.25,1.438,-1.9206,-.25,-.3513,3.36,-.25,.7643],
// 4 15 2.16 -.25 4.0989 3.36 -.25 .7643 6.6674 -.25 1.1525 7.4137 -.25 1.3822
  [4,15,2.16,-.25,4.0989,3.36,-.25,.7643,6.6674,-.25,1.1525,7.4137,-.25,1.3822],
// 4 15 2.16 -.25 4.0989 7.4137 -.25 1.3822 8.0295 -.25 1.8622 8.4344 -.25 2.5298
  [4,15,2.16,-.25,4.0989,7.4137,-.25,1.3822,8.0295,-.25,1.8622,8.4344,-.25,2.5298],
// 4 15 2.16 -.25 4.0989 8.4344 -.25 2.5298 8.5756 -.25 3.2978 8.4161 -.25 4.0997
  [4,15,2.16,-.25,4.0989,8.4344,-.25,2.5298,8.5756,-.25,3.2978,8.4161,-.25,4.0997],
// 4 15 2.16 -.25 4.0989 8.4161 -.25 4.0997 7.9618 -.25 4.7796 7.2819 -.25 5.2339
  [4,15,2.16,-.25,4.0989,8.4161,-.25,4.0997,7.9618,-.25,4.7796,7.2819,-.25,5.2339],
// 4 15 2.16 -.25 4.0989 7.2819 -.25 5.2339 6.48 -.25 5.3934 5.3405 -.25 5.3103
  [4,15,2.16,-.25,4.0989,7.2819,-.25,5.2339,6.48,-.25,5.3934,5.3405,-.25,5.3103],
// 4 15 2.16 -.25 4.0989 5.3405 -.25 5.3103 4.2251 -.25 5.0628 3.1574 -.25 4.6561
  [4,15,2.16,-.25,4.0989,5.3405,-.25,5.3103,4.2251,-.25,5.0628,3.1574,-.25,4.6561],
// 4 15 3.36 -.25 -1.3957 3.36 -.25 .7643 -1.9206 -.25 -.3513 -2.7957 -.25 -2.0023
  [4,15,3.36,-.25,-1.3957,3.36,-.25,.7643,-1.9206,-.25,-.3513,-2.7957,-.25,-2.0023],
// 3 15 3.36 -.25 -1.3957 -2.7957 -.25 -2.0023 -3.9741 -.25 -3.4525
  [3,15,3.36,-.25,-1.3957,-2.7957,-.25,-2.0023,-3.9741,-.25,-3.4525],
// 4 15 3.36 -.25 -1.3957 -3.9741 -.25 -3.4525 -7.5232 -.25 -7.0414 -.72 -.25 -7.0414
  [4,15,3.36,-.25,-1.3957,-3.9741,-.25,-3.4525,-7.5232,-.25,-7.0414,-.72,-.25,-7.0414],
// 4 15 -.72 -.25 -7.0414 -.72 -.25 -9.7774 1.68 -.25 -6.0048 3.36 -.25 -1.3957
  [4,15,-.72,-.25,-7.0414,-.72,-.25,-9.7774,1.68,-.25,-6.0048,3.36,-.25,-1.3957],
// 4 15 3.36 -.25 -1.3957 1.68 -.25 -6.0048 2.8478 -.25 -6.6409 4.0941 -.25 -7.1047
  [4,15,3.36,-.25,-1.3957,1.68,-.25,-6.0048,2.8478,-.25,-6.6409,4.0941,-.25,-7.1047],
// 4 15 3.36 -.25 -1.3957 4.0941 -.25 -7.1047 5.3936 -.25 -7.3868 6.72 -.25 -7.4815
  [4,15,3.36,-.25,-1.3957,4.0941,-.25,-7.1047,5.3936,-.25,-7.3868,6.72,-.25,-7.4815],
// 4 15 3.36 -.25 -1.3957 6.72 -.25 -7.4815 7.7224 -.25 -7.2821 8.5721 -.25 -6.7143
  [4,15,3.36,-.25,-1.3957,6.72,-.25,-7.4815,7.7224,-.25,-7.2821,8.5721,-.25,-6.7143],
// 4 15 3.36 -.25 -1.3957 8.5721 -.25 -6.7143 9.1399 -.25 -5.8646 9.3393 -.25 -4.8622
  [4,15,3.36,-.25,-1.3957,8.5721,-.25,-6.7143,9.1399,-.25,-5.8646,9.3393,-.25,-4.8622],
// 4 15 3.36 -.25 -1.3957 9.3393 -.25 -4.8622 9.193 -.25 -3.999 8.7704 -.25 -3.2323
  [4,15,3.36,-.25,-1.3957,9.3393,-.25,-4.8622,9.193,-.25,-3.999,8.7704,-.25,-3.2323],
// 4 15 3.36 -.25 -1.3957 8.7704 -.25 -3.2323 8.1187 -.25 -2.6476 7.3108 -.25 -2.3104
  [4,15,3.36,-.25,-1.3957,8.7704,-.25,-3.2323,8.1187,-.25,-2.6476,7.3108,-.25,-2.3104],
// 3 15 -.72 -.25 -9.7774 .864 -.25 -8.6163 1.68 -.25 -6.0048
  [3,15,-.72,-.25,-9.7774,.864,-.25,-8.6163,1.68,-.25,-6.0048],
// 3 15 .864 -.25 -8.6163 -.72 -.25 -9.7774 2.2428 -.25 -9.2757
  [3,15,.864,-.25,-8.6163,-.72,-.25,-9.7774,2.2428,-.25,-9.2757],
// 3 15 2.2428 -.25 -9.2757 -.72 -.25 -9.7774 3.6942 -.25 -9.7545
  [3,15,2.2428,-.25,-9.2757,-.72,-.25,-9.7774,3.6942,-.25,-9.7545],
// 4 15 -10.56 -.25 3.9517 -11.64 -.25 6.4655 -12.4497 -.25 7.9497 -14.5 -.25 3
  [4,15,-10.56,-.25,3.9517,-11.64,-.25,6.4655,-12.4497,-.25,7.9497,-14.5,-.25,3],
// 4 15 -10.56 -.25 3.9517 -14.5 -.25 3 -12 -.25 -7.7422 -5.887 -.25 -1.5608
  [4,15,-10.56,-.25,3.9517,-14.5,-.25,3,-12,-.25,-7.7422,-5.887,-.25,-1.5608],
// 4 15 -10.56 -.25 3.9517 -5.887 -.25 -1.5608 -5.0389 -.25 -.517 -4.409 -.25 .6714
  [4,15,-10.56,-.25,3.9517,-5.887,-.25,-1.5608,-5.0389,-.25,-.517,-4.409,-.25,.6714],
// 4 15 -10.56 -.25 3.9517 -4.409 -.25 .6714 -4.0212 -.25 1.9592 -3.8903 -.25 3.2978
  [4,15,-10.56,-.25,3.9517,-4.409,-.25,.6714,-4.0212,-.25,1.9592,-3.8903,-.25,3.2978],
// 3 15 -10.56 -.25 3.9517 -3.8903 -.25 3.2978 -4.0509 -.25 4.1051
  [3,15,-10.56,-.25,3.9517,-3.8903,-.25,3.2978,-4.0509,-.25,4.1051],
// 4 15 -10.56 -.25 3.9517 -4.0509 -.25 4.1051 -4.5082 -.25 4.7896 -5.1927 -.25 5.2469
  [4,15,-10.56,-.25,3.9517,-4.0509,-.25,4.1051,-4.5082,-.25,4.7896,-5.1927,-.25,5.2469],
// 4 15 -10.56 -.25 3.9517 -5.1927 -.25 5.2469 -6 -.25 5.4075 -7.2111 -.25 5.3137
  [4,15,-10.56,-.25,3.9517,-5.1927,-.25,5.2469,-6,-.25,5.4075,-7.2111,-.25,5.3137],
// 4 15 -10.56 -.25 3.9517 -7.2111 -.25 5.3137 -8.3934 -.25 5.0347 -9.5186 -.25 4.577
  [4,15,-10.56,-.25,3.9517,-7.2111,-.25,5.3137,-8.3934,-.25,5.0347,-9.5186,-.25,4.577],
// 3 15 14.5 -.25 3 9.8741 -.25 6.6919 10.9146 -.25 5.1347
  [3,15,14.5,-.25,3,9.8741,-.25,6.6919,10.9146,-.25,5.1347],
// 3 15 14.5 -.25 3 10.9146 -.25 5.1347 11.28 -.25 3.2978
  [3,15,14.5,-.25,3,10.9146,-.25,5.1347,11.28,-.25,3.2978],
// 3 15 14.5 -.25 3 11.28 -.25 3.2978 11.1012 -.25 2.1395
  [3,15,14.5,-.25,3,11.28,-.25,3.2978,11.1012,-.25,2.1395],
// 3 15 14.5 -.25 3 11.1012 -.25 2.1395 10.5813 -.25 1.0891
  [3,15,14.5,-.25,3,11.1012,-.25,2.1395,10.5813,-.25,1.0891],
// 4 15 10.0571 -.25 -1.0051 14.5 -.25 3 10.5813 -.25 1.0891 9.7687 -.25 .2445
  [4,15,10.0571,-.25,-1.0051,14.5,-.25,3,10.5813,-.25,1.0891,9.7687,-.25,.2445],
// 3 15 9.7687 -.25 .2445 8.7393 -.25 -.3157 10.0571 -.25 -1.0051
  [3,15,9.7687,-.25,.2445,8.7393,-.25,-.3157,10.0571,-.25,-1.0051],
// 3 15 14.5 -.25 3 10.0571 -.25 -1.0051 11.1006 -.25 -2.0648
  [3,15,14.5,-.25,3,10.0571,-.25,-1.0051,11.1006,-.25,-2.0648],
// 3 15 14.5 -.25 3 11.1006 -.25 -2.0648 11.7696 -.25 -3.393
  [3,15,14.5,-.25,3,11.1006,-.25,-2.0648,11.7696,-.25,-3.393],
// 3 15 14.5 -.25 3 11.7696 -.25 -3.393 12 -.25 -4.8622
  [3,15,14.5,-.25,3,11.7696,-.25,-3.393,12,-.25,-4.8622],
// 4 15 14.5 -.25 -12.1422 14.5 -.25 3 12 -.25 -4.8622 11.5981 -.25 -6.8828
  [4,15,14.5,-.25,-12.1422,14.5,-.25,3,12,-.25,-4.8622,11.5981,-.25,-6.8828],
// 3 15 14.5 -.25 -12.1422 11.5981 -.25 -6.8828 10.4535 -.25 -8.5957
  [3,15,14.5,-.25,-12.1422,11.5981,-.25,-6.8828,10.4535,-.25,-8.5957],
// 3 15 14.5 -.25 -12.1422 10.4535 -.25 -8.5957 8.7406 -.25 -9.7403
  [3,15,14.5,-.25,-12.1422,10.4535,-.25,-8.5957,8.7406,-.25,-9.7403],
// 3 15 14.5 -.25 -12.1422 8.7406 -.25 -9.7403 6.72 -.25 -10.1422
  [3,15,14.5,-.25,-12.1422,8.7406,-.25,-9.7403,6.72,-.25,-10.1422],
// 3 15 14.5 -.25 -12.1422 6.72 -.25 -10.1422 5.1947 -.25 -10.0449
  [3,15,14.5,-.25,-12.1422,6.72,-.25,-10.1422,5.1947,-.25,-10.0449],
// 4 15 14.5 -.25 -12.1422 5.1947 -.25 -10.0449 3.6942 -.25 -9.7545 -.72 -.25 -9.7774
  [4,15,14.5,-.25,-12.1422,5.1947,-.25,-10.0449,3.6942,-.25,-9.7545,-.72,-.25,-9.7774],
];
module ldraw_lib__6148328ak(step=0, col=false, unit=2/5, alt=false, line=0.2, solid=!$preview)
    makepoly(ldraw_lib__6148328ak(), step=step, col=col, unit=unit, alt=alt, line=line, solid=solid);
ldraw_lib__6148328ak(line=0.2);
